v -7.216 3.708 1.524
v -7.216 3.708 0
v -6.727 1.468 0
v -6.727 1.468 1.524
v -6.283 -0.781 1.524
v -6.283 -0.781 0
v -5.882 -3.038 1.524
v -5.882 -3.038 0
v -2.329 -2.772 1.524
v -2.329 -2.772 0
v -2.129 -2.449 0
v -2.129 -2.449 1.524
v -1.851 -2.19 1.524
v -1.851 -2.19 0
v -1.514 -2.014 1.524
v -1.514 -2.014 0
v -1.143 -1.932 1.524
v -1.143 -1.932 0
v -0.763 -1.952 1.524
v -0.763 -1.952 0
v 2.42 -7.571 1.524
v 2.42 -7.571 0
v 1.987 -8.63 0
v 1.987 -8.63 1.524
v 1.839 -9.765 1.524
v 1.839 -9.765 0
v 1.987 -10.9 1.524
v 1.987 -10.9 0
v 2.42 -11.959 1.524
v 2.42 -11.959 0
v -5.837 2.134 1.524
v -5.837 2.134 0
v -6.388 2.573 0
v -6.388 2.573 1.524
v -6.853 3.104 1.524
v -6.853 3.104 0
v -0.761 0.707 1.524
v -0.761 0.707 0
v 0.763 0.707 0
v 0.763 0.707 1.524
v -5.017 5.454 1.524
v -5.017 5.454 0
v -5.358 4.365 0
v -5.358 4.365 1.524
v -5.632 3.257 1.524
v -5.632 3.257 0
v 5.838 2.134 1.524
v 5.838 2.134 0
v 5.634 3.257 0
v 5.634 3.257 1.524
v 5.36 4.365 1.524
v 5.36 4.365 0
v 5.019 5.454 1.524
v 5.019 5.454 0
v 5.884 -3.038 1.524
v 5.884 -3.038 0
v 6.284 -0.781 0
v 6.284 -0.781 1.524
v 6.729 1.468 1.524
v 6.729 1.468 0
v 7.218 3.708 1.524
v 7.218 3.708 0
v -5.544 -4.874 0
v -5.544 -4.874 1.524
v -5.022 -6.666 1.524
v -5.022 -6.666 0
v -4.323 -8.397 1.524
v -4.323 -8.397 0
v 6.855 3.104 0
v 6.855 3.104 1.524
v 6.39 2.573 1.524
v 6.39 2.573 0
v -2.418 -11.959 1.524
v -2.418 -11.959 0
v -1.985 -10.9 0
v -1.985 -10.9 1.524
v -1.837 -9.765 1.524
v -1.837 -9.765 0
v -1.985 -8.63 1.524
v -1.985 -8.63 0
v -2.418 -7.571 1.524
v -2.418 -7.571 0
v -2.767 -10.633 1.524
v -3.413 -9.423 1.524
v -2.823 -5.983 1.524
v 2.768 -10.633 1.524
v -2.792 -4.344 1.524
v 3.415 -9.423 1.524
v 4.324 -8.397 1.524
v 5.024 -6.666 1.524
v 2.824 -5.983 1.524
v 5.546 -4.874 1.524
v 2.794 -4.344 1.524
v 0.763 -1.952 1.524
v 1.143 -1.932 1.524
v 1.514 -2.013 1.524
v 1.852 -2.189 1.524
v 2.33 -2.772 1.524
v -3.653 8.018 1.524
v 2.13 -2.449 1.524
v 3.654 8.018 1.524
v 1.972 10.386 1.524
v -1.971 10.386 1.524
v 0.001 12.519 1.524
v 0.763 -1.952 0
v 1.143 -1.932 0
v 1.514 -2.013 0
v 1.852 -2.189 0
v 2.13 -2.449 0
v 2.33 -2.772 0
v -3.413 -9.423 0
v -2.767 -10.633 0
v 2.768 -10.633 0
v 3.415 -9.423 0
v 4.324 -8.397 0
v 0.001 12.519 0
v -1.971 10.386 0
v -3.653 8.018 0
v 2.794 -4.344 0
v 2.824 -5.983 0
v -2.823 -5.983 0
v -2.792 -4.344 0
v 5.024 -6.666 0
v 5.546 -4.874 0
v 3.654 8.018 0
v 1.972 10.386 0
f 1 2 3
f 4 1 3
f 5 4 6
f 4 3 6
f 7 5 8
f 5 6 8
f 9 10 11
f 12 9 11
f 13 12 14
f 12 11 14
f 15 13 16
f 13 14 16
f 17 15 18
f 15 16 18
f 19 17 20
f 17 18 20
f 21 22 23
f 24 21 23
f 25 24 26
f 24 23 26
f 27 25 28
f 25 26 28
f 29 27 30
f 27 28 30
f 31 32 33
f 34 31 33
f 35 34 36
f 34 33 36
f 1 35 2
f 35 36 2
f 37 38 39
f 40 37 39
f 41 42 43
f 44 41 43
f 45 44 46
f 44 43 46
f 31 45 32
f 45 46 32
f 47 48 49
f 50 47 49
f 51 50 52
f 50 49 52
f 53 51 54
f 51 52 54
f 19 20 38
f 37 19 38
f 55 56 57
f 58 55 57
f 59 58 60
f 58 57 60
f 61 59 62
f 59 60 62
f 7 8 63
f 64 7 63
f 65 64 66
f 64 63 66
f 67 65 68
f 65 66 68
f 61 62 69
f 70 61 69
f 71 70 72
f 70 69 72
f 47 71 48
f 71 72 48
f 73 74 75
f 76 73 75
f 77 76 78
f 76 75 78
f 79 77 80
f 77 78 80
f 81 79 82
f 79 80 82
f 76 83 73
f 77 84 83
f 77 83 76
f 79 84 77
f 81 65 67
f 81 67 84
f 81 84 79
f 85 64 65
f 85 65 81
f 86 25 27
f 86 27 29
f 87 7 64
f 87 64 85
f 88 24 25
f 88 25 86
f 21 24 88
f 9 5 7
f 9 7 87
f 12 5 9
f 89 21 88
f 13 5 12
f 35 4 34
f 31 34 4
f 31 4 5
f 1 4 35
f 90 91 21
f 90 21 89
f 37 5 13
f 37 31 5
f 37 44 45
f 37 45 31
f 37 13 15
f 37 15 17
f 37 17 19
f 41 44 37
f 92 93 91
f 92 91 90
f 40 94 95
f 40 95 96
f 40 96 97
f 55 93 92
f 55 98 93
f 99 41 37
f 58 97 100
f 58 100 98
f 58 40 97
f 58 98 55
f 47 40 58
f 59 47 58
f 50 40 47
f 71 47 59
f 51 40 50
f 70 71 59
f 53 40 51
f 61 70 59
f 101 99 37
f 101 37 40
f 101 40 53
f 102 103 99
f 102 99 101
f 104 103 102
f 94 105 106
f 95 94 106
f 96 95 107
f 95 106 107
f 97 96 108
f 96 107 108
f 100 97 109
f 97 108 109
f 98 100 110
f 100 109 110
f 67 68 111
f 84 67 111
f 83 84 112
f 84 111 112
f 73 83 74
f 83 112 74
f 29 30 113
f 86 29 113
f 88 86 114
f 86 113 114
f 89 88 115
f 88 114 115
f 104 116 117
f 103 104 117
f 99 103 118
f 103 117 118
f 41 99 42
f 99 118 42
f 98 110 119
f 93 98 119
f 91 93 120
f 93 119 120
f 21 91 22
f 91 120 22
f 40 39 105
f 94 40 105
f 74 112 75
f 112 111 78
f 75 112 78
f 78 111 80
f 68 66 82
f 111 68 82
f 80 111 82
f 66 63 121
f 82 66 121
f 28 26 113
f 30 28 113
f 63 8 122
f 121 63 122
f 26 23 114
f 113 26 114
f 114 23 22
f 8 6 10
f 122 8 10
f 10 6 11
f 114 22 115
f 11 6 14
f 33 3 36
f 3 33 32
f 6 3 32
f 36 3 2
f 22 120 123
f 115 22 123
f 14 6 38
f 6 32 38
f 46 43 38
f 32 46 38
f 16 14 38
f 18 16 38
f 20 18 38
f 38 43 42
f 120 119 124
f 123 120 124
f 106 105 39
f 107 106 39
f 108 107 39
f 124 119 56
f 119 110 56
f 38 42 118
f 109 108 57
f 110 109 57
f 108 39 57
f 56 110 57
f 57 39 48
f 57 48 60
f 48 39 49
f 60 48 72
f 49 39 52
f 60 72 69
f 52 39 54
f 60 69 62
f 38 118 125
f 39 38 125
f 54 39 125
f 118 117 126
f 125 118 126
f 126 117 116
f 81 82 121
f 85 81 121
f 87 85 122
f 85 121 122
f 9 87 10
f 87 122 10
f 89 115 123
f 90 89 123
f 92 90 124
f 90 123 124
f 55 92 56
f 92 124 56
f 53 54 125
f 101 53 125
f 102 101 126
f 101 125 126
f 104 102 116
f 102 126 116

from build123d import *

# Parameters (mm, degrees)
BOSS_EXTRUDE1_DEPTH = 1.524


with BuildPart() as part:
    # Sketch1 → Boss-Extrude1 (new body)
    with BuildSketch(Plane.XY):
        with BuildLine():
            Line((0.762804565, 0.707113294), (0.762617378, -1.952243646))
            ThreePointArc((0.762617378, -1.952243646), (1.688876918, -2.090003107), (2.330283806, -2.772301873))
            ThreePointArc((2.330283806, -2.772301873), (2.864179893, -5.162377967), (2.419859411, -7.570715168))
            ThreePointArc((2.419859411, -7.570715168), (1.838969345, -9.764772757), (2.419550535, -11.958912099))
            ThreePointArc((2.419550535, -11.958912099), (3.056385936, -10.009011099), (4.324266146, -8.396512102))
            ThreePointArc((4.324266146, -8.396512102), (5.30756259, -5.77657732), (5.883862124, -3.038181986))
            ThreePointArc((5.883862124, -3.038181986), (6.501160971, 0.344941452), (7.217868451, 3.708408777))
            ThreePointArc((7.217868451, 3.708408777), (6.634279276, 2.828156935), (5.838122451, 2.134216059))
            ThreePointArc((5.838122451, 2.134216059), (5.505397312, 3.813158809), (5.018716283, 5.454102548))
            ThreePointArc((5.018716283, 5.454102548), (2.851221099, 9.229151646), (0.000807633, 12.519162913))
            ThreePointArc((0.000807633, 12.519162913), (-2.849605833, 9.229151646), (-5.017101017, 5.454102548))
            ThreePointArc((-5.017101017, 5.454102548), (-5.503782046, 3.813158809), (-5.836507185, 2.134216059))
            ThreePointArc((-5.836507185, 2.134216059), (-6.63266401, 2.828156935), (-7.216253185, 3.708408777))
            ThreePointArc((-7.216253185, 3.708408777), (-6.499545704, 0.344941452), (-5.882246858, -3.038181986))
            ThreePointArc((-5.882246858, -3.038181986), (-5.305947324, -5.77657732), (-4.32265088, -8.396512102))
            ThreePointArc((-4.32265088, -8.396512102), (-3.05477067, -10.009011099), (-2.417935269, -11.958912099))
            ThreePointArc((-2.417935269, -11.958912099), (-1.837354079, -9.764772757), (-2.418244145, -7.570715168))
            ThreePointArc((-2.418244145, -7.570715168), (-2.862564627, -5.162377967), (-2.32866854, -2.772301873))
            ThreePointArc((-2.32866854, -2.772301873), (-1.688352617, -2.090574399), (-0.763422707, -1.951788625))
            Line((-0.763422707, -1.951788625), (-0.761189299, 0.707113294))
            Line((-0.761189299, 0.707113294), (0.762804565, 0.707113294))
        make_face()
    extrude(amount=BOSS_EXTRUDE1_DEPTH)


solid = part.part
